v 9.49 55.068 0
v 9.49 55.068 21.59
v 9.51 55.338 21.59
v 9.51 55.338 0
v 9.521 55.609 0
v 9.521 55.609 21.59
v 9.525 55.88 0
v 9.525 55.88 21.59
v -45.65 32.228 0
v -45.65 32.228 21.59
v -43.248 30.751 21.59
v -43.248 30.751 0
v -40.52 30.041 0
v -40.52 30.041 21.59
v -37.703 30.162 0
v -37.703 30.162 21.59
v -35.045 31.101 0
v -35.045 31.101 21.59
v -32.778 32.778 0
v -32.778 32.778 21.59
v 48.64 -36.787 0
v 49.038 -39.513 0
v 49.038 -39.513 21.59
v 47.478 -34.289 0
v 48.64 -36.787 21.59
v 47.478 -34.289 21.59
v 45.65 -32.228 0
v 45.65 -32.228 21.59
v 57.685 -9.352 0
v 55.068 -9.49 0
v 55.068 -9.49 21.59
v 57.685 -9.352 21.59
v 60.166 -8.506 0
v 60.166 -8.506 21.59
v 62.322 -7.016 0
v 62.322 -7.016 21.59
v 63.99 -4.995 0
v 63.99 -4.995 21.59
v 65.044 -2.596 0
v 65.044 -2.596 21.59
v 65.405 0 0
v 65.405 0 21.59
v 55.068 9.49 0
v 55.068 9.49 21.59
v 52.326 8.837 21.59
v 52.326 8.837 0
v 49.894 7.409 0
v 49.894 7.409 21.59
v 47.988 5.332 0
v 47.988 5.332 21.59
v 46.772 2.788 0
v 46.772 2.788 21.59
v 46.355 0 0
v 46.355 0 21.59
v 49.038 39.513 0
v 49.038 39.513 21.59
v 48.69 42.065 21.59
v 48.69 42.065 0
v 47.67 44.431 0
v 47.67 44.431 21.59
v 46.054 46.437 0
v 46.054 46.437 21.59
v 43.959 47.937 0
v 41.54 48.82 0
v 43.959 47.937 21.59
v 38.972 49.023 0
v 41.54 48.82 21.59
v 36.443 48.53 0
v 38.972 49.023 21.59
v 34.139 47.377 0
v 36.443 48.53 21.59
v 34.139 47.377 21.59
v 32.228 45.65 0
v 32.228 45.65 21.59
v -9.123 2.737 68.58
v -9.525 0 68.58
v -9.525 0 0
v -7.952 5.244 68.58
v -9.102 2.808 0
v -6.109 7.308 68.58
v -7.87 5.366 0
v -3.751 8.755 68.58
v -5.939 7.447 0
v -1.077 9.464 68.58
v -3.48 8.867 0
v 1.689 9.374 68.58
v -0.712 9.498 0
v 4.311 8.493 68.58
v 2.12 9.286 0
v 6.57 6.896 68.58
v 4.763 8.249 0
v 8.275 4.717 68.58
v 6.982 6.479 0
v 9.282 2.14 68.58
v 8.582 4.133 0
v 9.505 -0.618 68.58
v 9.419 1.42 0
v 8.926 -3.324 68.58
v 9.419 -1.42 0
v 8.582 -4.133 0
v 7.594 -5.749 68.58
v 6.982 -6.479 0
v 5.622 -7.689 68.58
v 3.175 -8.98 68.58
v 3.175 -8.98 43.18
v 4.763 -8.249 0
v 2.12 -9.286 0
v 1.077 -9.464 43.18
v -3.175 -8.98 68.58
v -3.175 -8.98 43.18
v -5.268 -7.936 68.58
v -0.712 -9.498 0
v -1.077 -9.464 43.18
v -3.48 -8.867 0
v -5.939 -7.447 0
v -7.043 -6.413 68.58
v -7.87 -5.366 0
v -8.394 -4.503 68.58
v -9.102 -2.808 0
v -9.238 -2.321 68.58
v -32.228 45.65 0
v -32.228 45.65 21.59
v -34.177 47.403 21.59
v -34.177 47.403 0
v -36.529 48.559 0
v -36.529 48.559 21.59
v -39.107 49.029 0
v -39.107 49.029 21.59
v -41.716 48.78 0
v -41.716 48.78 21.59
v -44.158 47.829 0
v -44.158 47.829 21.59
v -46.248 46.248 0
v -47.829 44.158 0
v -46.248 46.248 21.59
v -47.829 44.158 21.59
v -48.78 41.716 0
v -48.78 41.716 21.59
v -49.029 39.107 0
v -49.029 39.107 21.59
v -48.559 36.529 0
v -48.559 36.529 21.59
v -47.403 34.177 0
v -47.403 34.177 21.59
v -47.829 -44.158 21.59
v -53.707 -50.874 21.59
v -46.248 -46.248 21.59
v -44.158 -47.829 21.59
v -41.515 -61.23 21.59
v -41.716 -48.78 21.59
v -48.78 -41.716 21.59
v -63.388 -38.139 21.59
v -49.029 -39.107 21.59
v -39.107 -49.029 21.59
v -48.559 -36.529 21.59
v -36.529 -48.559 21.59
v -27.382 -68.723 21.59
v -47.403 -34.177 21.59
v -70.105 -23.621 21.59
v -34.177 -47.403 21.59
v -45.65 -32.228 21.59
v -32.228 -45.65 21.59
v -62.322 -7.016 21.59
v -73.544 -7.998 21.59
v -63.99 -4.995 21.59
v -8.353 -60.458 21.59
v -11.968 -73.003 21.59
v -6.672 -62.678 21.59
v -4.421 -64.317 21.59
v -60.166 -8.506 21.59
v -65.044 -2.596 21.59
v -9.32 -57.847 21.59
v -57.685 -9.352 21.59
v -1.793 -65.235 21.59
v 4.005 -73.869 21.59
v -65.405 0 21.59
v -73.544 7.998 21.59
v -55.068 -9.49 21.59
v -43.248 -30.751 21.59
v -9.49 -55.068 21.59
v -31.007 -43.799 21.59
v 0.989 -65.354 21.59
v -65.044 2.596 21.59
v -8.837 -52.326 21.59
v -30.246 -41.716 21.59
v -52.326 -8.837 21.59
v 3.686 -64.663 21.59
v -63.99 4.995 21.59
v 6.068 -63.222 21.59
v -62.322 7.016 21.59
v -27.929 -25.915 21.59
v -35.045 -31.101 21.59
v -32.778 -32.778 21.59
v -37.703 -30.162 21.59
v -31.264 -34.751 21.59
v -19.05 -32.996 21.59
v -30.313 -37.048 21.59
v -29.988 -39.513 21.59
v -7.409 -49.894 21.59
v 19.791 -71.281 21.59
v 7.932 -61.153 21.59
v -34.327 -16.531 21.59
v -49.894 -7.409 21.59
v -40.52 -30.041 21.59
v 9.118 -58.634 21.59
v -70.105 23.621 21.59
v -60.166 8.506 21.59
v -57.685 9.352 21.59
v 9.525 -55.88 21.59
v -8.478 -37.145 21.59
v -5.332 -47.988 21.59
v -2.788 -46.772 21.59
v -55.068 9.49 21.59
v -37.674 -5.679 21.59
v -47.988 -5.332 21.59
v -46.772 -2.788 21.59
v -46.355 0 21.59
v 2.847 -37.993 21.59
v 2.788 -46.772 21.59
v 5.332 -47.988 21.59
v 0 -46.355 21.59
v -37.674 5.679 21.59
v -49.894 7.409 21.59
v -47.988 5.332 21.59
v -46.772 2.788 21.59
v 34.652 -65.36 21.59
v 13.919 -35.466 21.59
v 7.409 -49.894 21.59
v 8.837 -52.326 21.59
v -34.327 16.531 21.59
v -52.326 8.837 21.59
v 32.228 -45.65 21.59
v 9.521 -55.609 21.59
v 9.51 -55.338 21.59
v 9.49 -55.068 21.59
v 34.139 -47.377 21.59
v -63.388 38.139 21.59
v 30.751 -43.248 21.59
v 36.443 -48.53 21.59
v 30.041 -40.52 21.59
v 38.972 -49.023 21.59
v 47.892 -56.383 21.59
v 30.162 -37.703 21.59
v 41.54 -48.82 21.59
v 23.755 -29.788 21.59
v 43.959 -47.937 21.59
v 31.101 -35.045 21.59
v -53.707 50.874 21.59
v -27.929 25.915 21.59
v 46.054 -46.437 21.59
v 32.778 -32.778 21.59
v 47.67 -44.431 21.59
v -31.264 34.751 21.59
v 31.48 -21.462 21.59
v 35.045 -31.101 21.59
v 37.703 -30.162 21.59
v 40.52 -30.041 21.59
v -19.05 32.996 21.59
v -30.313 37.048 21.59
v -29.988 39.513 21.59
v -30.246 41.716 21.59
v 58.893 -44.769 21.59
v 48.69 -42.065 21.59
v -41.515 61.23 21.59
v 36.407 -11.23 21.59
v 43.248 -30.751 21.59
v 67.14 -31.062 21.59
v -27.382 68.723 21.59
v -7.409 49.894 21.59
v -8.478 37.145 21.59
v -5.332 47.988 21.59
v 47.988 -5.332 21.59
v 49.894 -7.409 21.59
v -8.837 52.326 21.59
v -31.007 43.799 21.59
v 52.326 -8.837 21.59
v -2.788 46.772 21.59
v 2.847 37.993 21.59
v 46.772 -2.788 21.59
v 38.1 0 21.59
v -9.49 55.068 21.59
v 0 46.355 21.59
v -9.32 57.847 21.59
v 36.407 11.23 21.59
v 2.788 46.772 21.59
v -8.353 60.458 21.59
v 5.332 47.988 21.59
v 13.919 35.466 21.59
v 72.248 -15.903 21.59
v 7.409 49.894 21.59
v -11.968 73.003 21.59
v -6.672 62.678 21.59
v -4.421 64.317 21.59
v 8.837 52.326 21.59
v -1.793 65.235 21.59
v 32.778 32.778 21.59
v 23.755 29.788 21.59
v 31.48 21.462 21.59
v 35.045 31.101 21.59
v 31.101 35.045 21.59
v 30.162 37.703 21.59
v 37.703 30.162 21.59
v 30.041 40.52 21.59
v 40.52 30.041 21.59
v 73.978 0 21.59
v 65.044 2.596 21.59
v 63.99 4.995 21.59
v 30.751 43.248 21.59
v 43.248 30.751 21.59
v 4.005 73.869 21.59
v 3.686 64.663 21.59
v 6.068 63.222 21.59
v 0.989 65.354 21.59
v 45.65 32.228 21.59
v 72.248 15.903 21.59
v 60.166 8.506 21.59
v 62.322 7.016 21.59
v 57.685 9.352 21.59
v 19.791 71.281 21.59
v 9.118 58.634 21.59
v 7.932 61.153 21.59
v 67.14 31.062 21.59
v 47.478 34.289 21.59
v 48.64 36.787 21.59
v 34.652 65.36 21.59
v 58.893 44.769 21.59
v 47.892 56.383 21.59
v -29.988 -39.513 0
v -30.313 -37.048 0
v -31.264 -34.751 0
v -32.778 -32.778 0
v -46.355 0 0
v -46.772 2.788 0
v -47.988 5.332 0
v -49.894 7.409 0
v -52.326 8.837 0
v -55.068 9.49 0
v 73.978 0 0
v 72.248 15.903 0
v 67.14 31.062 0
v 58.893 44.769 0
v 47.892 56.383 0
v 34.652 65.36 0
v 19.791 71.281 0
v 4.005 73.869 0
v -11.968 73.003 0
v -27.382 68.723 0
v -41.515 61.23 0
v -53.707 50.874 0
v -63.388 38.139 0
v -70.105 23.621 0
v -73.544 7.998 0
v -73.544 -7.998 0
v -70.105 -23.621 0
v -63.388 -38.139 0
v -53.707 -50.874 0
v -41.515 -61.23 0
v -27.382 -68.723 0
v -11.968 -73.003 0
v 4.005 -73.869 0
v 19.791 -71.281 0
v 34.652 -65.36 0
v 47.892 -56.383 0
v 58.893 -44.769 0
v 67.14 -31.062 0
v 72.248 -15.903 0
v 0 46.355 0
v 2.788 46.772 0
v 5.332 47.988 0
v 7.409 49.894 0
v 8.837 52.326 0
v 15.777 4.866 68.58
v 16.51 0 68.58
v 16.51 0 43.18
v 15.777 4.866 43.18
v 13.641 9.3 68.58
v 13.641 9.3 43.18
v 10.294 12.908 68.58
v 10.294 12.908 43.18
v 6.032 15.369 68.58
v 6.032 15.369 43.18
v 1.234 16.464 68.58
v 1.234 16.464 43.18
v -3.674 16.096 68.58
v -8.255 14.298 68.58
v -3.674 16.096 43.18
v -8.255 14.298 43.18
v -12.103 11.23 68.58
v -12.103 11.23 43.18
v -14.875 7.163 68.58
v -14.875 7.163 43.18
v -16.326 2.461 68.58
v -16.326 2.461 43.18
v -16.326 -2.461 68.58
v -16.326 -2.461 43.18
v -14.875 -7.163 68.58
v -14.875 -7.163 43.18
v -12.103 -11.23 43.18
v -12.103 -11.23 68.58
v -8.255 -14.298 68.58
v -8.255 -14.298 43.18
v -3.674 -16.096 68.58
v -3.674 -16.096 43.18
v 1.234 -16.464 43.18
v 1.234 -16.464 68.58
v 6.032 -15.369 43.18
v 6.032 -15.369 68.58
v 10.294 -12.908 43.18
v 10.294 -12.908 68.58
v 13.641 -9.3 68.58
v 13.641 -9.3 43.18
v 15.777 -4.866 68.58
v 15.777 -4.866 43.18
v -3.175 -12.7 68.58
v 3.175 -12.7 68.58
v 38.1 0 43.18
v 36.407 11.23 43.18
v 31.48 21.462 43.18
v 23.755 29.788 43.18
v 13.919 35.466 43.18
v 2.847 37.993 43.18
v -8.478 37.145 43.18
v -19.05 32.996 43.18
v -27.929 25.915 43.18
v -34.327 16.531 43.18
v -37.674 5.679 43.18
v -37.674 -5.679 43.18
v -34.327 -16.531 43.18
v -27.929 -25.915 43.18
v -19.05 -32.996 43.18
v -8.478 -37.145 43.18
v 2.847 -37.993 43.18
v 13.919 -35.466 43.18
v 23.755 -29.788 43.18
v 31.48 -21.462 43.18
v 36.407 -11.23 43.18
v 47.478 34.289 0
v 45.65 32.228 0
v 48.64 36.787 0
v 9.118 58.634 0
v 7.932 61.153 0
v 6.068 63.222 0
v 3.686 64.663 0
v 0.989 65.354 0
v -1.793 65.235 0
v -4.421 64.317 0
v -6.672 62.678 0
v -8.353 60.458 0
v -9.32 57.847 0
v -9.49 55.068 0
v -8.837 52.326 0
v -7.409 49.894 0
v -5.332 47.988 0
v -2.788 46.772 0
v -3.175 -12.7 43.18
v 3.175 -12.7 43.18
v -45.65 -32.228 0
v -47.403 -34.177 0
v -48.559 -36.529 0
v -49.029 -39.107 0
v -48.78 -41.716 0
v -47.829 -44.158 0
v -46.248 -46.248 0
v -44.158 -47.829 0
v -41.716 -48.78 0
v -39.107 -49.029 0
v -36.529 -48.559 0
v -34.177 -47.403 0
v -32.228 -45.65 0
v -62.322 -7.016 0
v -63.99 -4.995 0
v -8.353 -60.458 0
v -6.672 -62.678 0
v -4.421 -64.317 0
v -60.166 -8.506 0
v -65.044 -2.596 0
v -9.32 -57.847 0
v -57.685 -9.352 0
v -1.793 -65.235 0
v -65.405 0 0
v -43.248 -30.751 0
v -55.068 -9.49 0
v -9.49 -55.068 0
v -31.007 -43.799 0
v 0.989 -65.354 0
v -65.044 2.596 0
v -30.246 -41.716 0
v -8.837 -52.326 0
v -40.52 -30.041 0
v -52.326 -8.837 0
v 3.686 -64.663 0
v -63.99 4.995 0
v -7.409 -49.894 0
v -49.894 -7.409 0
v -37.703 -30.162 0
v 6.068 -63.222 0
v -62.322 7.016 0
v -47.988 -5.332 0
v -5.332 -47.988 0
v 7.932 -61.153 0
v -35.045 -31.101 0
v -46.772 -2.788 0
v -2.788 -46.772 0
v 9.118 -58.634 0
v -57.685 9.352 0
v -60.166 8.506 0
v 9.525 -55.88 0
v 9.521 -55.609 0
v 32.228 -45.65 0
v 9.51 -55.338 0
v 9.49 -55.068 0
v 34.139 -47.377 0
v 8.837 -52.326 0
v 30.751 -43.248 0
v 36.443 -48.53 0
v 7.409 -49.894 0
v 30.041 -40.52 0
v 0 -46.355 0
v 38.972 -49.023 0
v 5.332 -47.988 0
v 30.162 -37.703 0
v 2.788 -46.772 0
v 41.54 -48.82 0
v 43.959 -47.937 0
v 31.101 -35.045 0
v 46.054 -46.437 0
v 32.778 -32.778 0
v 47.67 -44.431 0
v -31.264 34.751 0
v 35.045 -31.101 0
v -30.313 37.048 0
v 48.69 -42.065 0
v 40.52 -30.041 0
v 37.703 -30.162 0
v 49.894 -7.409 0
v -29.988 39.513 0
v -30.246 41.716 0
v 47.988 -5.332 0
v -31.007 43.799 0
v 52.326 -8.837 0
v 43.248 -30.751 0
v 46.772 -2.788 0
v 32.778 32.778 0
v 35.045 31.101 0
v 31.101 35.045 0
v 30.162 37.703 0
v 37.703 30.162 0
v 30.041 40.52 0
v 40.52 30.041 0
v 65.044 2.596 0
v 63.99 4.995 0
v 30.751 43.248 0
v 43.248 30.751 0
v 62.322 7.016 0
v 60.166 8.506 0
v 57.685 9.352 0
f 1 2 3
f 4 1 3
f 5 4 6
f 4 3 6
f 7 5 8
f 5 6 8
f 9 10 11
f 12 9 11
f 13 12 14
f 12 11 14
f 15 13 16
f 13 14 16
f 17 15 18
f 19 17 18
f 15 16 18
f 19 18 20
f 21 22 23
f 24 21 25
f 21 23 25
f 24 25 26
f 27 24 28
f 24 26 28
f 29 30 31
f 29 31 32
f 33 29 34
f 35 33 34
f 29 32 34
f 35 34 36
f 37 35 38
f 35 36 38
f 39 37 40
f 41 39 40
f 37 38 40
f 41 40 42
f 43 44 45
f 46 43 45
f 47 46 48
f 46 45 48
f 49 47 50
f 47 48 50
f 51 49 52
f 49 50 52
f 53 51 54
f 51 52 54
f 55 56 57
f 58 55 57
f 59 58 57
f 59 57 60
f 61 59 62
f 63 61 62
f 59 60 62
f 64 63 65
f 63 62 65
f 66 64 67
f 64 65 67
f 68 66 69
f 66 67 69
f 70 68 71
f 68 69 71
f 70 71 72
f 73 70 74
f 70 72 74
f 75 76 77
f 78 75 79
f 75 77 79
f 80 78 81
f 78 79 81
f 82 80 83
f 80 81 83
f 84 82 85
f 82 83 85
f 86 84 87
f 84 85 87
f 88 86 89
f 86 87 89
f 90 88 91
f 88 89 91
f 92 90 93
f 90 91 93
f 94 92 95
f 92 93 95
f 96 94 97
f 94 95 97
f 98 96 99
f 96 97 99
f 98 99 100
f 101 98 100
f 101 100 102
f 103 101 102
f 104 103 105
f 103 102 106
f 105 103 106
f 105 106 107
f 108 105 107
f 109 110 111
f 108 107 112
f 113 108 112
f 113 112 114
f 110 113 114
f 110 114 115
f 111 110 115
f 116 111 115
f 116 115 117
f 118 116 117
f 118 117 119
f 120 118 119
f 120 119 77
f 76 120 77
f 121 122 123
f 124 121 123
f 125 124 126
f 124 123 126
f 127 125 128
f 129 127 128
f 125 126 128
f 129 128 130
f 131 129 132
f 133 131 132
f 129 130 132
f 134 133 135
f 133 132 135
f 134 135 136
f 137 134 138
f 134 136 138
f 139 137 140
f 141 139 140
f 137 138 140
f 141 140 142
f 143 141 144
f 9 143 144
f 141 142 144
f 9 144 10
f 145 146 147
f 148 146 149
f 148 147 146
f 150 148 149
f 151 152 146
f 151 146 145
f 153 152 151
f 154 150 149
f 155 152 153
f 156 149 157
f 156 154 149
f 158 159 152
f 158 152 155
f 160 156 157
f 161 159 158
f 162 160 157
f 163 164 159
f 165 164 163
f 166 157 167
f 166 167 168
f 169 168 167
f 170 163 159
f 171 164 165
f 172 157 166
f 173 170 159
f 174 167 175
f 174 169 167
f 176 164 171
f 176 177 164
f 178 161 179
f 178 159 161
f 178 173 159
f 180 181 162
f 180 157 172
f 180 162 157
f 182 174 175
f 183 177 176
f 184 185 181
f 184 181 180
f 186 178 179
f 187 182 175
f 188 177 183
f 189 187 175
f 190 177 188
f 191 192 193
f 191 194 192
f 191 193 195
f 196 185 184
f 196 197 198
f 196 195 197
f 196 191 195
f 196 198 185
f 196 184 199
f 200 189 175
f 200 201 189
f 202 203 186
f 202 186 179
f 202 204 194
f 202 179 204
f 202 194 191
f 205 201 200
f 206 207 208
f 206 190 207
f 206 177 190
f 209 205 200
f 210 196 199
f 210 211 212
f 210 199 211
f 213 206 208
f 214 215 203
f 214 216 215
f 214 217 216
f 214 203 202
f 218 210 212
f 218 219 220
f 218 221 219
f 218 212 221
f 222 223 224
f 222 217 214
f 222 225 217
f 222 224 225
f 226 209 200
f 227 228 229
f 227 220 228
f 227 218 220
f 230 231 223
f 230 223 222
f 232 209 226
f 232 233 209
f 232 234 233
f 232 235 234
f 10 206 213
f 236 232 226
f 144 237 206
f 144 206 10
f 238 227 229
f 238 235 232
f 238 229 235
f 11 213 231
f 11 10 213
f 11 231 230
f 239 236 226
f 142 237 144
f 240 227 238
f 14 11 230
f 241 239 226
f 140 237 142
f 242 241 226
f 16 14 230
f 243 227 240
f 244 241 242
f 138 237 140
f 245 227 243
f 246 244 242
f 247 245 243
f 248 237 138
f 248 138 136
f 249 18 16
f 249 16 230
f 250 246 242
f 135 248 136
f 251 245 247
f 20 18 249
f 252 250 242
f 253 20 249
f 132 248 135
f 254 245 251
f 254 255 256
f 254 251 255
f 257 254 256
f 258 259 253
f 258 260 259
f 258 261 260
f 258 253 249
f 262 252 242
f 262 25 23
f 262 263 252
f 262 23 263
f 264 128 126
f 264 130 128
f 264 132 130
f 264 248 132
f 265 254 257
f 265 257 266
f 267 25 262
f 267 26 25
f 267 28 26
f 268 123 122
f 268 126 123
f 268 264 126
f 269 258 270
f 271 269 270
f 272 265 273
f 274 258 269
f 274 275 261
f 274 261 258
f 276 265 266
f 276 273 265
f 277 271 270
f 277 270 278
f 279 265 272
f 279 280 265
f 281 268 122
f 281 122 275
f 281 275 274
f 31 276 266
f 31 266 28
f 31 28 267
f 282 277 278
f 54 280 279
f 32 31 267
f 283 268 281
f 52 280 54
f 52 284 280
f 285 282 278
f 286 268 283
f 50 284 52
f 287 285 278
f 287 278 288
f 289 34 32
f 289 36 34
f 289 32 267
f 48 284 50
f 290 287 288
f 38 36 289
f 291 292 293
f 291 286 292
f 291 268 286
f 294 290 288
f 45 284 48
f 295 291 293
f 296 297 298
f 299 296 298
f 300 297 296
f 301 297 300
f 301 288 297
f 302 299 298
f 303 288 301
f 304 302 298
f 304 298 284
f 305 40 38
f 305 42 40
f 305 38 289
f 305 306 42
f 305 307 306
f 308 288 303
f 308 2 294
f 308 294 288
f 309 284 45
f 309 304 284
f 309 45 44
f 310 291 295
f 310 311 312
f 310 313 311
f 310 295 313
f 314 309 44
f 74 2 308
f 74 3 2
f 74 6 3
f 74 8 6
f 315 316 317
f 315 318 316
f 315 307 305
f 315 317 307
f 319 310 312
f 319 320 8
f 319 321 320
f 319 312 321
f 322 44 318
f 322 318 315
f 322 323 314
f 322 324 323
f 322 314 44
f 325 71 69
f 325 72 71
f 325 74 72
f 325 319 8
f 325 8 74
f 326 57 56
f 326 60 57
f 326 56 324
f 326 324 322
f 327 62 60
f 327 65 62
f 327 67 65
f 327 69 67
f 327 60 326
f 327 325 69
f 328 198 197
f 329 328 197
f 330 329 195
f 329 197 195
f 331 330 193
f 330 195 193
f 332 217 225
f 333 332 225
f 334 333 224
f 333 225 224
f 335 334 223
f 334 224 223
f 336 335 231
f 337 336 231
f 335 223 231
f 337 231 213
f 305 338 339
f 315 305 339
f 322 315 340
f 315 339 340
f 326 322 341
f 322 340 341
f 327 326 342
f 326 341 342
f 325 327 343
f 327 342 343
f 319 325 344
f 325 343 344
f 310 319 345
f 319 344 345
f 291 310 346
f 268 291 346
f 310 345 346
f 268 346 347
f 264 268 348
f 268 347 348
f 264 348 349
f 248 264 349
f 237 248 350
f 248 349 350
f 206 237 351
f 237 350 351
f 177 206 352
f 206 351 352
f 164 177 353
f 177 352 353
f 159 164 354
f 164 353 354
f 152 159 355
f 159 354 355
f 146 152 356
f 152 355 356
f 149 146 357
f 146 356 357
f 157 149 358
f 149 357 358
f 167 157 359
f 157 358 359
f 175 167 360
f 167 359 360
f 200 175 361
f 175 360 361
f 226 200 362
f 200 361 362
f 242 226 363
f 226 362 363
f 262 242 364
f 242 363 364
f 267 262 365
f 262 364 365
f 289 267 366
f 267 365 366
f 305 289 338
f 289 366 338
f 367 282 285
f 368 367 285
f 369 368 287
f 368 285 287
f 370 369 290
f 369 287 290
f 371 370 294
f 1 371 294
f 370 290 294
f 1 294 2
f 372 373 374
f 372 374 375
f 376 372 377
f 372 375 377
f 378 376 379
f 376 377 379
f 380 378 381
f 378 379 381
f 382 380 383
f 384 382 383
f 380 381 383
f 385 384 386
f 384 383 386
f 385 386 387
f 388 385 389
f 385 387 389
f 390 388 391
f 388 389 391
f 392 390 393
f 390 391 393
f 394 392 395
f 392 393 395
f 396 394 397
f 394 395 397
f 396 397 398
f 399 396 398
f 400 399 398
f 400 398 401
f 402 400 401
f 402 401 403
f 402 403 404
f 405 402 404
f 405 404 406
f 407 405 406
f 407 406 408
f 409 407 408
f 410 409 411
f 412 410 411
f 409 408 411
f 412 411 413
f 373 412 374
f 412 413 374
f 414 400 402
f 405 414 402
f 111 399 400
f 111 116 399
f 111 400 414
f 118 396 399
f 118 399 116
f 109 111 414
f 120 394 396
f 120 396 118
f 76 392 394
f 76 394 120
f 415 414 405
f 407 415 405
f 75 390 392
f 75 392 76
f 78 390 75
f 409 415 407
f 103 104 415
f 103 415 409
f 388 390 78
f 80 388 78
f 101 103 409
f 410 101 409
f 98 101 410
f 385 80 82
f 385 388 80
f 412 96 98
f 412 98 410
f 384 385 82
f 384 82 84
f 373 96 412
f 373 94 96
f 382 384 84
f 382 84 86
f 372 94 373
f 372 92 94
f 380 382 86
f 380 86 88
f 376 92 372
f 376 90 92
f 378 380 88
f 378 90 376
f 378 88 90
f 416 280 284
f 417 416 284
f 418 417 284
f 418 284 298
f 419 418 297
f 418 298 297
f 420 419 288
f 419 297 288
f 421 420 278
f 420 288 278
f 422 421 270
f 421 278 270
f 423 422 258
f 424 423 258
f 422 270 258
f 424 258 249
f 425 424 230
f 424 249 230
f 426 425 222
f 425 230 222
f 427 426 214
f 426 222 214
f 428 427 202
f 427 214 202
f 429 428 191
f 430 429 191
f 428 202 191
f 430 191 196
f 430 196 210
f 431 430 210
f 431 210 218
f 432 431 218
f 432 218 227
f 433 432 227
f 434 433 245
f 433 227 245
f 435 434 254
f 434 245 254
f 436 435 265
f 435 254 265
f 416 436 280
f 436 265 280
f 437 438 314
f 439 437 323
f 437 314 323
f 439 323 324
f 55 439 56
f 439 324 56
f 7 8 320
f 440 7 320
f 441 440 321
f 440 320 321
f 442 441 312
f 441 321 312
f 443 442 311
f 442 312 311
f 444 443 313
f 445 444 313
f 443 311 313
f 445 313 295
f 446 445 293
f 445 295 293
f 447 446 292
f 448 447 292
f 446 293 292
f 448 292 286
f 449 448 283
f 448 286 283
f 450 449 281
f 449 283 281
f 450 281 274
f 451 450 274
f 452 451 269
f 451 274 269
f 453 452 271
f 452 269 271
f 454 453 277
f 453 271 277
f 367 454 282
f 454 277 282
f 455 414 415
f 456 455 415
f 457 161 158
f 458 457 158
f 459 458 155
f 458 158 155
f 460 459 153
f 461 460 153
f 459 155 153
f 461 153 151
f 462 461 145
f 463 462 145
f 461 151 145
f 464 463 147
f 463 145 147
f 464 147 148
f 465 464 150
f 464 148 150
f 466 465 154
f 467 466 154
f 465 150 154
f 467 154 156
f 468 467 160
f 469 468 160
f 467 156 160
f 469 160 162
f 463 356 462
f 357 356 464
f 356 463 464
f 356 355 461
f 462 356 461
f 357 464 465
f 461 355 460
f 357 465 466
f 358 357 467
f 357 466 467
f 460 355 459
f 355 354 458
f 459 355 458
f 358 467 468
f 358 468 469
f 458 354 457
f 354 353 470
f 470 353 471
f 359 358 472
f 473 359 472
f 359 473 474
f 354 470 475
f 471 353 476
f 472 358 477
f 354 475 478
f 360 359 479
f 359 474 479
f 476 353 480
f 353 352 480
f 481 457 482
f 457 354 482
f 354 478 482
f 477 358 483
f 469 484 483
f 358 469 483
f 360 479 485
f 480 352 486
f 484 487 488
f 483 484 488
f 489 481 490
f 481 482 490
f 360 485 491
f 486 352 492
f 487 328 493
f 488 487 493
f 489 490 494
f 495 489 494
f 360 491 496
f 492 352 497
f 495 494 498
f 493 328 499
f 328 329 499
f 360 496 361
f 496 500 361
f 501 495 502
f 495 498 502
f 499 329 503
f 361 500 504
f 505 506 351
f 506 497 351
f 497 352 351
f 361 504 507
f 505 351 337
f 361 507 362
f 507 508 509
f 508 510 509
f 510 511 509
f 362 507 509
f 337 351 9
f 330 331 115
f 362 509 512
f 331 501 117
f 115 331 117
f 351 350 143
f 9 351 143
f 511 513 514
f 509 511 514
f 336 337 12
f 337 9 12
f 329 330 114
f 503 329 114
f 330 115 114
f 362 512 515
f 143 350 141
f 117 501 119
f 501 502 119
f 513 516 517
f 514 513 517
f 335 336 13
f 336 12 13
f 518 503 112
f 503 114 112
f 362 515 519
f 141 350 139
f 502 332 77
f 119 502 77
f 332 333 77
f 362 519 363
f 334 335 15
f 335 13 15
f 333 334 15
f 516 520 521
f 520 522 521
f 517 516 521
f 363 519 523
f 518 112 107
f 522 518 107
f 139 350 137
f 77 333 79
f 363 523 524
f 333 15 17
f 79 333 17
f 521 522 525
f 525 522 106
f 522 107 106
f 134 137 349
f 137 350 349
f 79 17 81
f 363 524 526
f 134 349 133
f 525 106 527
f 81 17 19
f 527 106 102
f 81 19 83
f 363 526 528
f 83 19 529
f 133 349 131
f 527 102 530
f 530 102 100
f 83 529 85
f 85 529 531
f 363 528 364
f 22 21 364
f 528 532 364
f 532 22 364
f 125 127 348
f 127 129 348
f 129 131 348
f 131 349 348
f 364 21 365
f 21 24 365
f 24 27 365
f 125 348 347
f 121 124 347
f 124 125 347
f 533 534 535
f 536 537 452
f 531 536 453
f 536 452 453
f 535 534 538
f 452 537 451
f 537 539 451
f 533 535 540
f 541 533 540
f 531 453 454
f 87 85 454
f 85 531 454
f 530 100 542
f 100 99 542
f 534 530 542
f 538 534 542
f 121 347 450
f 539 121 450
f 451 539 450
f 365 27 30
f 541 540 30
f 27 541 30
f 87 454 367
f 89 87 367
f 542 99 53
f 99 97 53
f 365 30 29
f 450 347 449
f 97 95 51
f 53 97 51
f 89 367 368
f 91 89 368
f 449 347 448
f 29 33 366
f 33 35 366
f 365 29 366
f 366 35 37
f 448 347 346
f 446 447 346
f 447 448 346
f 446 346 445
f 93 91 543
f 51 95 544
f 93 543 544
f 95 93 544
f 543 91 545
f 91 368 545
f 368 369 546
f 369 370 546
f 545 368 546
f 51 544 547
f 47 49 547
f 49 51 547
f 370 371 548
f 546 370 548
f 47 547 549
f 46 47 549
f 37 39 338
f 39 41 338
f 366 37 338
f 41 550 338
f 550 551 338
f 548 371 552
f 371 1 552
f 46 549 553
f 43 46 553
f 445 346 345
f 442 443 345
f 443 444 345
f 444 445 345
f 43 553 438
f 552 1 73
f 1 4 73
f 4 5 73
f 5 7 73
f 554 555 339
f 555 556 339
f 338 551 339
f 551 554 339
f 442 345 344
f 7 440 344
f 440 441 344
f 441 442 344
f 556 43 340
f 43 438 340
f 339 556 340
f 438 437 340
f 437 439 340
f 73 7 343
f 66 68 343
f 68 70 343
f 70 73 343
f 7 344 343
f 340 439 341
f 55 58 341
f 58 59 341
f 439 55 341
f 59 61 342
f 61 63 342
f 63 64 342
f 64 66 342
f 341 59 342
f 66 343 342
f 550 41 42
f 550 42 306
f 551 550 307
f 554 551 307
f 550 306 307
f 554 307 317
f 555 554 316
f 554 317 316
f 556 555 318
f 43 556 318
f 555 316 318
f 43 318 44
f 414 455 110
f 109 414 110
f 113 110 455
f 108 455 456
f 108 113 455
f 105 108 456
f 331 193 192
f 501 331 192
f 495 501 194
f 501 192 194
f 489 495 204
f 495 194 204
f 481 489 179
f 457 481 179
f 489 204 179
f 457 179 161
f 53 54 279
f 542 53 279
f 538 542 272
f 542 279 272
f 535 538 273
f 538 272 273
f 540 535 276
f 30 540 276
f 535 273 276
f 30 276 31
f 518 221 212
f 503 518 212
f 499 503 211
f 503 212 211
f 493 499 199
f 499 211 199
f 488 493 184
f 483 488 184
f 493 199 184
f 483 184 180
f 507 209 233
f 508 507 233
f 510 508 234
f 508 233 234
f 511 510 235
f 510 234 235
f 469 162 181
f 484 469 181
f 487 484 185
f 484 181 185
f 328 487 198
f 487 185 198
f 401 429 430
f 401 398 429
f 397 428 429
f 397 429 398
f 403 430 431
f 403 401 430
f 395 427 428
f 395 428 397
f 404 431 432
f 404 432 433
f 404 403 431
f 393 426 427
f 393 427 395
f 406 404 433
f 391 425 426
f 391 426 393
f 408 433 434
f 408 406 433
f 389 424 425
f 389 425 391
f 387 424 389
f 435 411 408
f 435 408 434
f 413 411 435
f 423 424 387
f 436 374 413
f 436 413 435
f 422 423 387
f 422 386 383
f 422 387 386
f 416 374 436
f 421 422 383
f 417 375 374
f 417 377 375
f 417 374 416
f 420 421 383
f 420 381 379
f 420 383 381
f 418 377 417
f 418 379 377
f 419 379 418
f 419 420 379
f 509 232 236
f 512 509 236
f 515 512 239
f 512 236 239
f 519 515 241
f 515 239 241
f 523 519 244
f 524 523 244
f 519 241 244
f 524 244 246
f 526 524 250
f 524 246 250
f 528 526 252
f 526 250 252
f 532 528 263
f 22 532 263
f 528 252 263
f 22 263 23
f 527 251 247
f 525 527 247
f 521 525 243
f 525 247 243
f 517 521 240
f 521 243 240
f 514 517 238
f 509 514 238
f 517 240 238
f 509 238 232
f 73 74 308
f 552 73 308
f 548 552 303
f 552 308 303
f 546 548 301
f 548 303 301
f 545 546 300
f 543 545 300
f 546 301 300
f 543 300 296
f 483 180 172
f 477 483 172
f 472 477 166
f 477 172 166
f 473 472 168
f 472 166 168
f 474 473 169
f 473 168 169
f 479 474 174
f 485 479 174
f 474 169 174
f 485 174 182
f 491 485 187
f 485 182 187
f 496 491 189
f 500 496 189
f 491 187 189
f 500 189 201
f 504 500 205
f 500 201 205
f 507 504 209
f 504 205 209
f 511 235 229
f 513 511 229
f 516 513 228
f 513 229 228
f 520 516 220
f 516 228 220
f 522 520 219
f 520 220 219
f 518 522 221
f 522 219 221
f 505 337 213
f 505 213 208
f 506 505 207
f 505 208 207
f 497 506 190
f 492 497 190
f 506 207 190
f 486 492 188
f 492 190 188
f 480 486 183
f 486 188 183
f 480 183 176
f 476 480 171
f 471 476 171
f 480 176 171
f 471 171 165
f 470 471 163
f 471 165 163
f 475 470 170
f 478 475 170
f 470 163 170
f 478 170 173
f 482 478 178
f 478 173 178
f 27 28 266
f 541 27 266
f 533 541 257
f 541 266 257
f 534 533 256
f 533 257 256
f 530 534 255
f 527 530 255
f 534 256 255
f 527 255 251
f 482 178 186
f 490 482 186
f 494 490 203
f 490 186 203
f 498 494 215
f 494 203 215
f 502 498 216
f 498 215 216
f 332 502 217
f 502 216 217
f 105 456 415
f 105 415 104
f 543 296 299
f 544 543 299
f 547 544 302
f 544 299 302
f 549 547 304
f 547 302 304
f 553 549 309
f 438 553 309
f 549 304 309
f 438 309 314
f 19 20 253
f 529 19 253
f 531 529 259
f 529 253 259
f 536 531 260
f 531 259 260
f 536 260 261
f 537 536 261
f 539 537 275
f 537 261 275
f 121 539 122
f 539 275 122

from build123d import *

# Parameters (mm, degrees)
F0_R      = 73.9775
F1_DEPTH  = 21.59
F3_DEPTH  = 21.591
F4_R      = 38.1
F5_DEPTH  = 21.59
F6_R      = 16.51
F7_DEPTH  = 25.4
F9_D      = 19.05
F10_W     = 6.35
F10_H     = 6.35
F11_DEPTH = 25.4


with BuildPart() as f1:
    # F0 (on Top) → F1 (new body)
    with BuildSketch(Plane.XY):
        Circle(F0_R)
    extrude(amount=F1_DEPTH)

    # F2 (on face) → F3 (cut, through all)
    with BuildSketch(Plane.XY.offset(21.59)):
        with BuildLine():
            ThreePointArc((-45.649791, 32.228419), (-42.736956, 36.001764), (-39.513127, 39.513127))
            ThreePointArc((-39.513127, 39.513127), (-36.001764, 42.736956), (-32.228419, 45.649791))
            ThreePointArc((-32.228419, 45.649791), (-46.248319, 46.248319), (-45.649791, 32.228419))
        make_face()
        with BuildLine():
            Line((-39.513127, 39.513127), (-32.777935, 32.777935))
            ThreePointArc((-32.777935, 32.777935), (-30.713174, 35.868067), (-29.988127, 39.513127))
            ThreePointArc((-29.988127, 39.513127), (-30.565712, 42.77953), (-32.228419, 45.649791))
            ThreePointArc((-32.228419, 45.649791), (-36.001764, 42.736956), (-39.513127, 39.513127))
        make_face()
        with BuildLine():
            ThreePointArc((-45.649791, 32.228419), (-39.106862, 29.996795), (-32.777935, 32.777935))
            Line((-32.777935, 32.777935), (-39.513127, 39.513127))
            ThreePointArc((-39.513127, 39.513127), (-42.736956, 36.001764), (-45.649791, 32.228419))
        make_face()
        with BuildLine():
            ThreePointArc((-9.490344, 55.06821), (-4.7625, 55.676683), (0, 55.88))
            ThreePointArc((0, 55.88), (4.7625, 55.676683), (9.490344, 55.06821))
            ThreePointArc((9.490344, 55.06821), (9.516332, 55.473735), (9.525, 55.88))
            ThreePointArc((9.525, 55.88), (-0.406265, 65.396332), (-9.490344, 55.06821))
        make_face()
        with BuildLine():
            Line((0, 55.88), (0, 46.355))
            ThreePointArc((0, 46.355), (6.44179, 48.863665), (9.490344, 55.06821))
            ThreePointArc((9.490344, 55.06821), (4.7625, 55.676683), (0, 55.88))
        make_face()
        with BuildLine():
            ThreePointArc((-9.490344, 55.06821), (-6.44179, 48.863665), (0, 46.355))
            Line((0, 46.355), (0, 55.88))
            ThreePointArc((0, 55.88), (-4.7625, 55.676683), (-9.490344, 55.06821))
        make_face()
        with BuildLine():
            ThreePointArc((32.777935, 32.777935), (39.106862, 29.996795), (45.649791, 32.228419))
            ThreePointArc((45.649791, 32.228419), (42.736956, 36.001764), (39.513127, 39.513127))
            Line((39.513127, 39.513127), (32.777935, 32.777935))
        make_face()
        with BuildLine():
            Line((32.777935, 32.777935), (39.513127, 39.513127))
            ThreePointArc((39.513127, 39.513127), (36.001764, 42.736956), (32.228419, 45.649791))
            ThreePointArc((32.228419, 45.649791), (29.996795, 39.106862), (32.777935, 32.777935))
        make_face()
        with BuildLine():
            ThreePointArc((39.513127, 39.513127), (42.736956, 36.001764), (45.649791, 32.228419))
            ThreePointArc((45.649791, 32.228419), (48.149601, 35.496045), (49.038127, 39.513127))
            ThreePointArc((49.038127, 39.513127), (42.77953, 48.460542), (32.228419, 45.649791))
            ThreePointArc((32.228419, 45.649791), (36.001764, 42.736956), (39.513127, 39.513127))
        make_face()
        with BuildLine():
            ThreePointArc((55.06821, -9.490344), (55.676683, -4.7625), (55.88, 0))
            Line((55.88, 0), (46.355, 0))
            ThreePointArc((46.355, 0), (48.863665, -6.44179), (55.06821, -9.490344))
        make_face()
        with BuildLine():
            ThreePointArc((55.06821, 9.490344), (55.676683, 4.7625), (55.88, 0))
            ThreePointArc((55.88, 0), (55.676683, -4.7625), (55.06821, -9.490344))
            ThreePointArc((55.06821, -9.490344), (62.32179, -7.016335), (65.405, 0))
            ThreePointArc((65.405, 0), (62.32179, 7.016335), (55.06821, 9.490344))
        make_face()
        with BuildLine():
            Line((46.355, 0), (55.88, 0))
            ThreePointArc((55.88, 0), (55.676683, 4.7625), (55.06821, 9.490344))
            ThreePointArc((55.06821, 9.490344), (48.863665, 6.44179), (46.355, 0))
        make_face()
        with BuildLine():
            ThreePointArc((32.228419, -45.649791), (36.001764, -42.736956), (39.513127, -39.513127))
            Line((39.513127, -39.513127), (32.777935, -32.777935))
            ThreePointArc((32.777935, -32.777935), (29.996795, -39.106862), (32.228419, -45.649791))
        make_face()
        with BuildLine():
            ThreePointArc((39.513127, -39.513127), (42.736956, -36.001764), (45.649791, -32.228419))
            ThreePointArc((45.649791, -32.228419), (39.106862, -29.996795), (32.777935, -32.777935))
            Line((32.777935, -32.777935), (39.513127, -39.513127))
        make_face()
        with BuildLine():
            ThreePointArc((49.038127, -39.513127), (48.149601, -35.496045), (45.649791, -32.228419))
            ThreePointArc((45.649791, -32.228419), (42.736956, -36.001764), (39.513127, -39.513127))
            ThreePointArc((39.513127, -39.513127), (36.001764, -42.736956), (32.228419, -45.649791))
            ThreePointArc((32.228419, -45.649791), (42.77953, -48.460542), (49.038127, -39.513127))
        make_face()
        with BuildLine():
            ThreePointArc((9.490344, -55.06821), (6.44179, -48.863665), (0, -46.355))
            Line((0, -46.355), (0, -55.88))
            ThreePointArc((0, -55.88), (4.7625, -55.676683), (9.490344, -55.06821))
        make_face()
        with BuildLine():
            Line((0, -55.88), (0, -46.355))
            ThreePointArc((0, -46.355), (-6.44179, -48.863665), (-9.490344, -55.06821))
            ThreePointArc((-9.490344, -55.06821), (-4.7625, -55.676683), (0, -55.88))
        make_face()
        with BuildLine():
            ThreePointArc((9.490344, -55.06821), (4.7625, -55.676683), (0, -55.88))
            ThreePointArc((0, -55.88), (-4.7625, -55.676683), (-9.490344, -55.06821))
            ThreePointArc((-9.490344, -55.06821), (-0.406265, -65.396332), (9.525, -55.88))
            ThreePointArc((9.525, -55.88), (9.516332, -55.473735), (9.490344, -55.06821))
        make_face()
        with BuildLine():
            ThreePointArc((-32.228419, -45.649791), (-36.001764, -42.736956), (-39.513127, -39.513127))
            ThreePointArc((-39.513127, -39.513127), (-42.736956, -36.001764), (-45.649791, -32.228419))
            ThreePointArc((-45.649791, -32.228419), (-46.248319, -46.248319), (-32.228419, -45.649791))
        make_face()
        with BuildLine():
            ThreePointArc((-29.988127, -39.513127), (-30.713174, -35.868067), (-32.777935, -32.777935))
            Line((-32.777935, -32.777935), (-39.513127, -39.513127))
            ThreePointArc((-39.513127, -39.513127), (-36.001764, -42.736956), (-32.228419, -45.649791))
            ThreePointArc((-32.228419, -45.649791), (-30.565712, -42.77953), (-29.988127, -39.513127))
        make_face()
        with BuildLine():
            Line((-39.513127, -39.513127), (-32.777935, -32.777935))
            ThreePointArc((-32.777935, -32.777935), (-39.106862, -29.996795), (-45.649791, -32.228419))
            ThreePointArc((-45.649791, -32.228419), (-42.736956, -36.001764), (-39.513127, -39.513127))
        make_face()
        with BuildLine():
            ThreePointArc((-55.06821, -9.490344), (-55.676683, -4.7625), (-55.88, 0))
            ThreePointArc((-55.88, 0), (-55.676683, 4.7625), (-55.06821, 9.490344))
            ThreePointArc((-55.06821, 9.490344), (-65.405, 0), (-55.06821, -9.490344))
        make_face()
        with BuildLine():
            Line((-55.88, 0), (-46.355, 0))
            ThreePointArc((-46.355, 0), (-48.863665, 6.44179), (-55.06821, 9.490344))
            ThreePointArc((-55.06821, 9.490344), (-55.676683, 4.7625), (-55.88, 0))
        make_face()
        with BuildLine():
            ThreePointArc((-55.06821, -9.490344), (-48.863665, -6.44179), (-46.355, 0))
            Line((-46.355, 0), (-55.88, 0))
            ThreePointArc((-55.88, 0), (-55.676683, -4.7625), (-55.06821, -9.490344))
        make_face()
    extrude(amount=-F3_DEPTH, mode=Mode.SUBTRACT)

    # F4 (on face) → F5 (join)
    with BuildSketch(Plane.XY.offset(21.59)):
        Circle(F4_R)
    extrude(amount=F5_DEPTH)

    # F6 (on face) → F7 (join)
    with BuildSketch(Plane.XY.offset(43.18)):
        Circle(F6_R)
    extrude(amount=F7_DEPTH)

    # F9 (through all)
    with Locations(Plane.XY.offset(68.58)):
        with Locations((0, 0)):
            Hole(F9_D / 2)

    # F10 (on face) → F11 (cut)
    with BuildSketch(Plane.XY.offset(68.58)):
        with Locations((0, -9.525)):
            Rectangle(F10_W, F10_H)
    extrude(amount=-F11_DEPTH, mode=Mode.SUBTRACT)


solid = f1.part
